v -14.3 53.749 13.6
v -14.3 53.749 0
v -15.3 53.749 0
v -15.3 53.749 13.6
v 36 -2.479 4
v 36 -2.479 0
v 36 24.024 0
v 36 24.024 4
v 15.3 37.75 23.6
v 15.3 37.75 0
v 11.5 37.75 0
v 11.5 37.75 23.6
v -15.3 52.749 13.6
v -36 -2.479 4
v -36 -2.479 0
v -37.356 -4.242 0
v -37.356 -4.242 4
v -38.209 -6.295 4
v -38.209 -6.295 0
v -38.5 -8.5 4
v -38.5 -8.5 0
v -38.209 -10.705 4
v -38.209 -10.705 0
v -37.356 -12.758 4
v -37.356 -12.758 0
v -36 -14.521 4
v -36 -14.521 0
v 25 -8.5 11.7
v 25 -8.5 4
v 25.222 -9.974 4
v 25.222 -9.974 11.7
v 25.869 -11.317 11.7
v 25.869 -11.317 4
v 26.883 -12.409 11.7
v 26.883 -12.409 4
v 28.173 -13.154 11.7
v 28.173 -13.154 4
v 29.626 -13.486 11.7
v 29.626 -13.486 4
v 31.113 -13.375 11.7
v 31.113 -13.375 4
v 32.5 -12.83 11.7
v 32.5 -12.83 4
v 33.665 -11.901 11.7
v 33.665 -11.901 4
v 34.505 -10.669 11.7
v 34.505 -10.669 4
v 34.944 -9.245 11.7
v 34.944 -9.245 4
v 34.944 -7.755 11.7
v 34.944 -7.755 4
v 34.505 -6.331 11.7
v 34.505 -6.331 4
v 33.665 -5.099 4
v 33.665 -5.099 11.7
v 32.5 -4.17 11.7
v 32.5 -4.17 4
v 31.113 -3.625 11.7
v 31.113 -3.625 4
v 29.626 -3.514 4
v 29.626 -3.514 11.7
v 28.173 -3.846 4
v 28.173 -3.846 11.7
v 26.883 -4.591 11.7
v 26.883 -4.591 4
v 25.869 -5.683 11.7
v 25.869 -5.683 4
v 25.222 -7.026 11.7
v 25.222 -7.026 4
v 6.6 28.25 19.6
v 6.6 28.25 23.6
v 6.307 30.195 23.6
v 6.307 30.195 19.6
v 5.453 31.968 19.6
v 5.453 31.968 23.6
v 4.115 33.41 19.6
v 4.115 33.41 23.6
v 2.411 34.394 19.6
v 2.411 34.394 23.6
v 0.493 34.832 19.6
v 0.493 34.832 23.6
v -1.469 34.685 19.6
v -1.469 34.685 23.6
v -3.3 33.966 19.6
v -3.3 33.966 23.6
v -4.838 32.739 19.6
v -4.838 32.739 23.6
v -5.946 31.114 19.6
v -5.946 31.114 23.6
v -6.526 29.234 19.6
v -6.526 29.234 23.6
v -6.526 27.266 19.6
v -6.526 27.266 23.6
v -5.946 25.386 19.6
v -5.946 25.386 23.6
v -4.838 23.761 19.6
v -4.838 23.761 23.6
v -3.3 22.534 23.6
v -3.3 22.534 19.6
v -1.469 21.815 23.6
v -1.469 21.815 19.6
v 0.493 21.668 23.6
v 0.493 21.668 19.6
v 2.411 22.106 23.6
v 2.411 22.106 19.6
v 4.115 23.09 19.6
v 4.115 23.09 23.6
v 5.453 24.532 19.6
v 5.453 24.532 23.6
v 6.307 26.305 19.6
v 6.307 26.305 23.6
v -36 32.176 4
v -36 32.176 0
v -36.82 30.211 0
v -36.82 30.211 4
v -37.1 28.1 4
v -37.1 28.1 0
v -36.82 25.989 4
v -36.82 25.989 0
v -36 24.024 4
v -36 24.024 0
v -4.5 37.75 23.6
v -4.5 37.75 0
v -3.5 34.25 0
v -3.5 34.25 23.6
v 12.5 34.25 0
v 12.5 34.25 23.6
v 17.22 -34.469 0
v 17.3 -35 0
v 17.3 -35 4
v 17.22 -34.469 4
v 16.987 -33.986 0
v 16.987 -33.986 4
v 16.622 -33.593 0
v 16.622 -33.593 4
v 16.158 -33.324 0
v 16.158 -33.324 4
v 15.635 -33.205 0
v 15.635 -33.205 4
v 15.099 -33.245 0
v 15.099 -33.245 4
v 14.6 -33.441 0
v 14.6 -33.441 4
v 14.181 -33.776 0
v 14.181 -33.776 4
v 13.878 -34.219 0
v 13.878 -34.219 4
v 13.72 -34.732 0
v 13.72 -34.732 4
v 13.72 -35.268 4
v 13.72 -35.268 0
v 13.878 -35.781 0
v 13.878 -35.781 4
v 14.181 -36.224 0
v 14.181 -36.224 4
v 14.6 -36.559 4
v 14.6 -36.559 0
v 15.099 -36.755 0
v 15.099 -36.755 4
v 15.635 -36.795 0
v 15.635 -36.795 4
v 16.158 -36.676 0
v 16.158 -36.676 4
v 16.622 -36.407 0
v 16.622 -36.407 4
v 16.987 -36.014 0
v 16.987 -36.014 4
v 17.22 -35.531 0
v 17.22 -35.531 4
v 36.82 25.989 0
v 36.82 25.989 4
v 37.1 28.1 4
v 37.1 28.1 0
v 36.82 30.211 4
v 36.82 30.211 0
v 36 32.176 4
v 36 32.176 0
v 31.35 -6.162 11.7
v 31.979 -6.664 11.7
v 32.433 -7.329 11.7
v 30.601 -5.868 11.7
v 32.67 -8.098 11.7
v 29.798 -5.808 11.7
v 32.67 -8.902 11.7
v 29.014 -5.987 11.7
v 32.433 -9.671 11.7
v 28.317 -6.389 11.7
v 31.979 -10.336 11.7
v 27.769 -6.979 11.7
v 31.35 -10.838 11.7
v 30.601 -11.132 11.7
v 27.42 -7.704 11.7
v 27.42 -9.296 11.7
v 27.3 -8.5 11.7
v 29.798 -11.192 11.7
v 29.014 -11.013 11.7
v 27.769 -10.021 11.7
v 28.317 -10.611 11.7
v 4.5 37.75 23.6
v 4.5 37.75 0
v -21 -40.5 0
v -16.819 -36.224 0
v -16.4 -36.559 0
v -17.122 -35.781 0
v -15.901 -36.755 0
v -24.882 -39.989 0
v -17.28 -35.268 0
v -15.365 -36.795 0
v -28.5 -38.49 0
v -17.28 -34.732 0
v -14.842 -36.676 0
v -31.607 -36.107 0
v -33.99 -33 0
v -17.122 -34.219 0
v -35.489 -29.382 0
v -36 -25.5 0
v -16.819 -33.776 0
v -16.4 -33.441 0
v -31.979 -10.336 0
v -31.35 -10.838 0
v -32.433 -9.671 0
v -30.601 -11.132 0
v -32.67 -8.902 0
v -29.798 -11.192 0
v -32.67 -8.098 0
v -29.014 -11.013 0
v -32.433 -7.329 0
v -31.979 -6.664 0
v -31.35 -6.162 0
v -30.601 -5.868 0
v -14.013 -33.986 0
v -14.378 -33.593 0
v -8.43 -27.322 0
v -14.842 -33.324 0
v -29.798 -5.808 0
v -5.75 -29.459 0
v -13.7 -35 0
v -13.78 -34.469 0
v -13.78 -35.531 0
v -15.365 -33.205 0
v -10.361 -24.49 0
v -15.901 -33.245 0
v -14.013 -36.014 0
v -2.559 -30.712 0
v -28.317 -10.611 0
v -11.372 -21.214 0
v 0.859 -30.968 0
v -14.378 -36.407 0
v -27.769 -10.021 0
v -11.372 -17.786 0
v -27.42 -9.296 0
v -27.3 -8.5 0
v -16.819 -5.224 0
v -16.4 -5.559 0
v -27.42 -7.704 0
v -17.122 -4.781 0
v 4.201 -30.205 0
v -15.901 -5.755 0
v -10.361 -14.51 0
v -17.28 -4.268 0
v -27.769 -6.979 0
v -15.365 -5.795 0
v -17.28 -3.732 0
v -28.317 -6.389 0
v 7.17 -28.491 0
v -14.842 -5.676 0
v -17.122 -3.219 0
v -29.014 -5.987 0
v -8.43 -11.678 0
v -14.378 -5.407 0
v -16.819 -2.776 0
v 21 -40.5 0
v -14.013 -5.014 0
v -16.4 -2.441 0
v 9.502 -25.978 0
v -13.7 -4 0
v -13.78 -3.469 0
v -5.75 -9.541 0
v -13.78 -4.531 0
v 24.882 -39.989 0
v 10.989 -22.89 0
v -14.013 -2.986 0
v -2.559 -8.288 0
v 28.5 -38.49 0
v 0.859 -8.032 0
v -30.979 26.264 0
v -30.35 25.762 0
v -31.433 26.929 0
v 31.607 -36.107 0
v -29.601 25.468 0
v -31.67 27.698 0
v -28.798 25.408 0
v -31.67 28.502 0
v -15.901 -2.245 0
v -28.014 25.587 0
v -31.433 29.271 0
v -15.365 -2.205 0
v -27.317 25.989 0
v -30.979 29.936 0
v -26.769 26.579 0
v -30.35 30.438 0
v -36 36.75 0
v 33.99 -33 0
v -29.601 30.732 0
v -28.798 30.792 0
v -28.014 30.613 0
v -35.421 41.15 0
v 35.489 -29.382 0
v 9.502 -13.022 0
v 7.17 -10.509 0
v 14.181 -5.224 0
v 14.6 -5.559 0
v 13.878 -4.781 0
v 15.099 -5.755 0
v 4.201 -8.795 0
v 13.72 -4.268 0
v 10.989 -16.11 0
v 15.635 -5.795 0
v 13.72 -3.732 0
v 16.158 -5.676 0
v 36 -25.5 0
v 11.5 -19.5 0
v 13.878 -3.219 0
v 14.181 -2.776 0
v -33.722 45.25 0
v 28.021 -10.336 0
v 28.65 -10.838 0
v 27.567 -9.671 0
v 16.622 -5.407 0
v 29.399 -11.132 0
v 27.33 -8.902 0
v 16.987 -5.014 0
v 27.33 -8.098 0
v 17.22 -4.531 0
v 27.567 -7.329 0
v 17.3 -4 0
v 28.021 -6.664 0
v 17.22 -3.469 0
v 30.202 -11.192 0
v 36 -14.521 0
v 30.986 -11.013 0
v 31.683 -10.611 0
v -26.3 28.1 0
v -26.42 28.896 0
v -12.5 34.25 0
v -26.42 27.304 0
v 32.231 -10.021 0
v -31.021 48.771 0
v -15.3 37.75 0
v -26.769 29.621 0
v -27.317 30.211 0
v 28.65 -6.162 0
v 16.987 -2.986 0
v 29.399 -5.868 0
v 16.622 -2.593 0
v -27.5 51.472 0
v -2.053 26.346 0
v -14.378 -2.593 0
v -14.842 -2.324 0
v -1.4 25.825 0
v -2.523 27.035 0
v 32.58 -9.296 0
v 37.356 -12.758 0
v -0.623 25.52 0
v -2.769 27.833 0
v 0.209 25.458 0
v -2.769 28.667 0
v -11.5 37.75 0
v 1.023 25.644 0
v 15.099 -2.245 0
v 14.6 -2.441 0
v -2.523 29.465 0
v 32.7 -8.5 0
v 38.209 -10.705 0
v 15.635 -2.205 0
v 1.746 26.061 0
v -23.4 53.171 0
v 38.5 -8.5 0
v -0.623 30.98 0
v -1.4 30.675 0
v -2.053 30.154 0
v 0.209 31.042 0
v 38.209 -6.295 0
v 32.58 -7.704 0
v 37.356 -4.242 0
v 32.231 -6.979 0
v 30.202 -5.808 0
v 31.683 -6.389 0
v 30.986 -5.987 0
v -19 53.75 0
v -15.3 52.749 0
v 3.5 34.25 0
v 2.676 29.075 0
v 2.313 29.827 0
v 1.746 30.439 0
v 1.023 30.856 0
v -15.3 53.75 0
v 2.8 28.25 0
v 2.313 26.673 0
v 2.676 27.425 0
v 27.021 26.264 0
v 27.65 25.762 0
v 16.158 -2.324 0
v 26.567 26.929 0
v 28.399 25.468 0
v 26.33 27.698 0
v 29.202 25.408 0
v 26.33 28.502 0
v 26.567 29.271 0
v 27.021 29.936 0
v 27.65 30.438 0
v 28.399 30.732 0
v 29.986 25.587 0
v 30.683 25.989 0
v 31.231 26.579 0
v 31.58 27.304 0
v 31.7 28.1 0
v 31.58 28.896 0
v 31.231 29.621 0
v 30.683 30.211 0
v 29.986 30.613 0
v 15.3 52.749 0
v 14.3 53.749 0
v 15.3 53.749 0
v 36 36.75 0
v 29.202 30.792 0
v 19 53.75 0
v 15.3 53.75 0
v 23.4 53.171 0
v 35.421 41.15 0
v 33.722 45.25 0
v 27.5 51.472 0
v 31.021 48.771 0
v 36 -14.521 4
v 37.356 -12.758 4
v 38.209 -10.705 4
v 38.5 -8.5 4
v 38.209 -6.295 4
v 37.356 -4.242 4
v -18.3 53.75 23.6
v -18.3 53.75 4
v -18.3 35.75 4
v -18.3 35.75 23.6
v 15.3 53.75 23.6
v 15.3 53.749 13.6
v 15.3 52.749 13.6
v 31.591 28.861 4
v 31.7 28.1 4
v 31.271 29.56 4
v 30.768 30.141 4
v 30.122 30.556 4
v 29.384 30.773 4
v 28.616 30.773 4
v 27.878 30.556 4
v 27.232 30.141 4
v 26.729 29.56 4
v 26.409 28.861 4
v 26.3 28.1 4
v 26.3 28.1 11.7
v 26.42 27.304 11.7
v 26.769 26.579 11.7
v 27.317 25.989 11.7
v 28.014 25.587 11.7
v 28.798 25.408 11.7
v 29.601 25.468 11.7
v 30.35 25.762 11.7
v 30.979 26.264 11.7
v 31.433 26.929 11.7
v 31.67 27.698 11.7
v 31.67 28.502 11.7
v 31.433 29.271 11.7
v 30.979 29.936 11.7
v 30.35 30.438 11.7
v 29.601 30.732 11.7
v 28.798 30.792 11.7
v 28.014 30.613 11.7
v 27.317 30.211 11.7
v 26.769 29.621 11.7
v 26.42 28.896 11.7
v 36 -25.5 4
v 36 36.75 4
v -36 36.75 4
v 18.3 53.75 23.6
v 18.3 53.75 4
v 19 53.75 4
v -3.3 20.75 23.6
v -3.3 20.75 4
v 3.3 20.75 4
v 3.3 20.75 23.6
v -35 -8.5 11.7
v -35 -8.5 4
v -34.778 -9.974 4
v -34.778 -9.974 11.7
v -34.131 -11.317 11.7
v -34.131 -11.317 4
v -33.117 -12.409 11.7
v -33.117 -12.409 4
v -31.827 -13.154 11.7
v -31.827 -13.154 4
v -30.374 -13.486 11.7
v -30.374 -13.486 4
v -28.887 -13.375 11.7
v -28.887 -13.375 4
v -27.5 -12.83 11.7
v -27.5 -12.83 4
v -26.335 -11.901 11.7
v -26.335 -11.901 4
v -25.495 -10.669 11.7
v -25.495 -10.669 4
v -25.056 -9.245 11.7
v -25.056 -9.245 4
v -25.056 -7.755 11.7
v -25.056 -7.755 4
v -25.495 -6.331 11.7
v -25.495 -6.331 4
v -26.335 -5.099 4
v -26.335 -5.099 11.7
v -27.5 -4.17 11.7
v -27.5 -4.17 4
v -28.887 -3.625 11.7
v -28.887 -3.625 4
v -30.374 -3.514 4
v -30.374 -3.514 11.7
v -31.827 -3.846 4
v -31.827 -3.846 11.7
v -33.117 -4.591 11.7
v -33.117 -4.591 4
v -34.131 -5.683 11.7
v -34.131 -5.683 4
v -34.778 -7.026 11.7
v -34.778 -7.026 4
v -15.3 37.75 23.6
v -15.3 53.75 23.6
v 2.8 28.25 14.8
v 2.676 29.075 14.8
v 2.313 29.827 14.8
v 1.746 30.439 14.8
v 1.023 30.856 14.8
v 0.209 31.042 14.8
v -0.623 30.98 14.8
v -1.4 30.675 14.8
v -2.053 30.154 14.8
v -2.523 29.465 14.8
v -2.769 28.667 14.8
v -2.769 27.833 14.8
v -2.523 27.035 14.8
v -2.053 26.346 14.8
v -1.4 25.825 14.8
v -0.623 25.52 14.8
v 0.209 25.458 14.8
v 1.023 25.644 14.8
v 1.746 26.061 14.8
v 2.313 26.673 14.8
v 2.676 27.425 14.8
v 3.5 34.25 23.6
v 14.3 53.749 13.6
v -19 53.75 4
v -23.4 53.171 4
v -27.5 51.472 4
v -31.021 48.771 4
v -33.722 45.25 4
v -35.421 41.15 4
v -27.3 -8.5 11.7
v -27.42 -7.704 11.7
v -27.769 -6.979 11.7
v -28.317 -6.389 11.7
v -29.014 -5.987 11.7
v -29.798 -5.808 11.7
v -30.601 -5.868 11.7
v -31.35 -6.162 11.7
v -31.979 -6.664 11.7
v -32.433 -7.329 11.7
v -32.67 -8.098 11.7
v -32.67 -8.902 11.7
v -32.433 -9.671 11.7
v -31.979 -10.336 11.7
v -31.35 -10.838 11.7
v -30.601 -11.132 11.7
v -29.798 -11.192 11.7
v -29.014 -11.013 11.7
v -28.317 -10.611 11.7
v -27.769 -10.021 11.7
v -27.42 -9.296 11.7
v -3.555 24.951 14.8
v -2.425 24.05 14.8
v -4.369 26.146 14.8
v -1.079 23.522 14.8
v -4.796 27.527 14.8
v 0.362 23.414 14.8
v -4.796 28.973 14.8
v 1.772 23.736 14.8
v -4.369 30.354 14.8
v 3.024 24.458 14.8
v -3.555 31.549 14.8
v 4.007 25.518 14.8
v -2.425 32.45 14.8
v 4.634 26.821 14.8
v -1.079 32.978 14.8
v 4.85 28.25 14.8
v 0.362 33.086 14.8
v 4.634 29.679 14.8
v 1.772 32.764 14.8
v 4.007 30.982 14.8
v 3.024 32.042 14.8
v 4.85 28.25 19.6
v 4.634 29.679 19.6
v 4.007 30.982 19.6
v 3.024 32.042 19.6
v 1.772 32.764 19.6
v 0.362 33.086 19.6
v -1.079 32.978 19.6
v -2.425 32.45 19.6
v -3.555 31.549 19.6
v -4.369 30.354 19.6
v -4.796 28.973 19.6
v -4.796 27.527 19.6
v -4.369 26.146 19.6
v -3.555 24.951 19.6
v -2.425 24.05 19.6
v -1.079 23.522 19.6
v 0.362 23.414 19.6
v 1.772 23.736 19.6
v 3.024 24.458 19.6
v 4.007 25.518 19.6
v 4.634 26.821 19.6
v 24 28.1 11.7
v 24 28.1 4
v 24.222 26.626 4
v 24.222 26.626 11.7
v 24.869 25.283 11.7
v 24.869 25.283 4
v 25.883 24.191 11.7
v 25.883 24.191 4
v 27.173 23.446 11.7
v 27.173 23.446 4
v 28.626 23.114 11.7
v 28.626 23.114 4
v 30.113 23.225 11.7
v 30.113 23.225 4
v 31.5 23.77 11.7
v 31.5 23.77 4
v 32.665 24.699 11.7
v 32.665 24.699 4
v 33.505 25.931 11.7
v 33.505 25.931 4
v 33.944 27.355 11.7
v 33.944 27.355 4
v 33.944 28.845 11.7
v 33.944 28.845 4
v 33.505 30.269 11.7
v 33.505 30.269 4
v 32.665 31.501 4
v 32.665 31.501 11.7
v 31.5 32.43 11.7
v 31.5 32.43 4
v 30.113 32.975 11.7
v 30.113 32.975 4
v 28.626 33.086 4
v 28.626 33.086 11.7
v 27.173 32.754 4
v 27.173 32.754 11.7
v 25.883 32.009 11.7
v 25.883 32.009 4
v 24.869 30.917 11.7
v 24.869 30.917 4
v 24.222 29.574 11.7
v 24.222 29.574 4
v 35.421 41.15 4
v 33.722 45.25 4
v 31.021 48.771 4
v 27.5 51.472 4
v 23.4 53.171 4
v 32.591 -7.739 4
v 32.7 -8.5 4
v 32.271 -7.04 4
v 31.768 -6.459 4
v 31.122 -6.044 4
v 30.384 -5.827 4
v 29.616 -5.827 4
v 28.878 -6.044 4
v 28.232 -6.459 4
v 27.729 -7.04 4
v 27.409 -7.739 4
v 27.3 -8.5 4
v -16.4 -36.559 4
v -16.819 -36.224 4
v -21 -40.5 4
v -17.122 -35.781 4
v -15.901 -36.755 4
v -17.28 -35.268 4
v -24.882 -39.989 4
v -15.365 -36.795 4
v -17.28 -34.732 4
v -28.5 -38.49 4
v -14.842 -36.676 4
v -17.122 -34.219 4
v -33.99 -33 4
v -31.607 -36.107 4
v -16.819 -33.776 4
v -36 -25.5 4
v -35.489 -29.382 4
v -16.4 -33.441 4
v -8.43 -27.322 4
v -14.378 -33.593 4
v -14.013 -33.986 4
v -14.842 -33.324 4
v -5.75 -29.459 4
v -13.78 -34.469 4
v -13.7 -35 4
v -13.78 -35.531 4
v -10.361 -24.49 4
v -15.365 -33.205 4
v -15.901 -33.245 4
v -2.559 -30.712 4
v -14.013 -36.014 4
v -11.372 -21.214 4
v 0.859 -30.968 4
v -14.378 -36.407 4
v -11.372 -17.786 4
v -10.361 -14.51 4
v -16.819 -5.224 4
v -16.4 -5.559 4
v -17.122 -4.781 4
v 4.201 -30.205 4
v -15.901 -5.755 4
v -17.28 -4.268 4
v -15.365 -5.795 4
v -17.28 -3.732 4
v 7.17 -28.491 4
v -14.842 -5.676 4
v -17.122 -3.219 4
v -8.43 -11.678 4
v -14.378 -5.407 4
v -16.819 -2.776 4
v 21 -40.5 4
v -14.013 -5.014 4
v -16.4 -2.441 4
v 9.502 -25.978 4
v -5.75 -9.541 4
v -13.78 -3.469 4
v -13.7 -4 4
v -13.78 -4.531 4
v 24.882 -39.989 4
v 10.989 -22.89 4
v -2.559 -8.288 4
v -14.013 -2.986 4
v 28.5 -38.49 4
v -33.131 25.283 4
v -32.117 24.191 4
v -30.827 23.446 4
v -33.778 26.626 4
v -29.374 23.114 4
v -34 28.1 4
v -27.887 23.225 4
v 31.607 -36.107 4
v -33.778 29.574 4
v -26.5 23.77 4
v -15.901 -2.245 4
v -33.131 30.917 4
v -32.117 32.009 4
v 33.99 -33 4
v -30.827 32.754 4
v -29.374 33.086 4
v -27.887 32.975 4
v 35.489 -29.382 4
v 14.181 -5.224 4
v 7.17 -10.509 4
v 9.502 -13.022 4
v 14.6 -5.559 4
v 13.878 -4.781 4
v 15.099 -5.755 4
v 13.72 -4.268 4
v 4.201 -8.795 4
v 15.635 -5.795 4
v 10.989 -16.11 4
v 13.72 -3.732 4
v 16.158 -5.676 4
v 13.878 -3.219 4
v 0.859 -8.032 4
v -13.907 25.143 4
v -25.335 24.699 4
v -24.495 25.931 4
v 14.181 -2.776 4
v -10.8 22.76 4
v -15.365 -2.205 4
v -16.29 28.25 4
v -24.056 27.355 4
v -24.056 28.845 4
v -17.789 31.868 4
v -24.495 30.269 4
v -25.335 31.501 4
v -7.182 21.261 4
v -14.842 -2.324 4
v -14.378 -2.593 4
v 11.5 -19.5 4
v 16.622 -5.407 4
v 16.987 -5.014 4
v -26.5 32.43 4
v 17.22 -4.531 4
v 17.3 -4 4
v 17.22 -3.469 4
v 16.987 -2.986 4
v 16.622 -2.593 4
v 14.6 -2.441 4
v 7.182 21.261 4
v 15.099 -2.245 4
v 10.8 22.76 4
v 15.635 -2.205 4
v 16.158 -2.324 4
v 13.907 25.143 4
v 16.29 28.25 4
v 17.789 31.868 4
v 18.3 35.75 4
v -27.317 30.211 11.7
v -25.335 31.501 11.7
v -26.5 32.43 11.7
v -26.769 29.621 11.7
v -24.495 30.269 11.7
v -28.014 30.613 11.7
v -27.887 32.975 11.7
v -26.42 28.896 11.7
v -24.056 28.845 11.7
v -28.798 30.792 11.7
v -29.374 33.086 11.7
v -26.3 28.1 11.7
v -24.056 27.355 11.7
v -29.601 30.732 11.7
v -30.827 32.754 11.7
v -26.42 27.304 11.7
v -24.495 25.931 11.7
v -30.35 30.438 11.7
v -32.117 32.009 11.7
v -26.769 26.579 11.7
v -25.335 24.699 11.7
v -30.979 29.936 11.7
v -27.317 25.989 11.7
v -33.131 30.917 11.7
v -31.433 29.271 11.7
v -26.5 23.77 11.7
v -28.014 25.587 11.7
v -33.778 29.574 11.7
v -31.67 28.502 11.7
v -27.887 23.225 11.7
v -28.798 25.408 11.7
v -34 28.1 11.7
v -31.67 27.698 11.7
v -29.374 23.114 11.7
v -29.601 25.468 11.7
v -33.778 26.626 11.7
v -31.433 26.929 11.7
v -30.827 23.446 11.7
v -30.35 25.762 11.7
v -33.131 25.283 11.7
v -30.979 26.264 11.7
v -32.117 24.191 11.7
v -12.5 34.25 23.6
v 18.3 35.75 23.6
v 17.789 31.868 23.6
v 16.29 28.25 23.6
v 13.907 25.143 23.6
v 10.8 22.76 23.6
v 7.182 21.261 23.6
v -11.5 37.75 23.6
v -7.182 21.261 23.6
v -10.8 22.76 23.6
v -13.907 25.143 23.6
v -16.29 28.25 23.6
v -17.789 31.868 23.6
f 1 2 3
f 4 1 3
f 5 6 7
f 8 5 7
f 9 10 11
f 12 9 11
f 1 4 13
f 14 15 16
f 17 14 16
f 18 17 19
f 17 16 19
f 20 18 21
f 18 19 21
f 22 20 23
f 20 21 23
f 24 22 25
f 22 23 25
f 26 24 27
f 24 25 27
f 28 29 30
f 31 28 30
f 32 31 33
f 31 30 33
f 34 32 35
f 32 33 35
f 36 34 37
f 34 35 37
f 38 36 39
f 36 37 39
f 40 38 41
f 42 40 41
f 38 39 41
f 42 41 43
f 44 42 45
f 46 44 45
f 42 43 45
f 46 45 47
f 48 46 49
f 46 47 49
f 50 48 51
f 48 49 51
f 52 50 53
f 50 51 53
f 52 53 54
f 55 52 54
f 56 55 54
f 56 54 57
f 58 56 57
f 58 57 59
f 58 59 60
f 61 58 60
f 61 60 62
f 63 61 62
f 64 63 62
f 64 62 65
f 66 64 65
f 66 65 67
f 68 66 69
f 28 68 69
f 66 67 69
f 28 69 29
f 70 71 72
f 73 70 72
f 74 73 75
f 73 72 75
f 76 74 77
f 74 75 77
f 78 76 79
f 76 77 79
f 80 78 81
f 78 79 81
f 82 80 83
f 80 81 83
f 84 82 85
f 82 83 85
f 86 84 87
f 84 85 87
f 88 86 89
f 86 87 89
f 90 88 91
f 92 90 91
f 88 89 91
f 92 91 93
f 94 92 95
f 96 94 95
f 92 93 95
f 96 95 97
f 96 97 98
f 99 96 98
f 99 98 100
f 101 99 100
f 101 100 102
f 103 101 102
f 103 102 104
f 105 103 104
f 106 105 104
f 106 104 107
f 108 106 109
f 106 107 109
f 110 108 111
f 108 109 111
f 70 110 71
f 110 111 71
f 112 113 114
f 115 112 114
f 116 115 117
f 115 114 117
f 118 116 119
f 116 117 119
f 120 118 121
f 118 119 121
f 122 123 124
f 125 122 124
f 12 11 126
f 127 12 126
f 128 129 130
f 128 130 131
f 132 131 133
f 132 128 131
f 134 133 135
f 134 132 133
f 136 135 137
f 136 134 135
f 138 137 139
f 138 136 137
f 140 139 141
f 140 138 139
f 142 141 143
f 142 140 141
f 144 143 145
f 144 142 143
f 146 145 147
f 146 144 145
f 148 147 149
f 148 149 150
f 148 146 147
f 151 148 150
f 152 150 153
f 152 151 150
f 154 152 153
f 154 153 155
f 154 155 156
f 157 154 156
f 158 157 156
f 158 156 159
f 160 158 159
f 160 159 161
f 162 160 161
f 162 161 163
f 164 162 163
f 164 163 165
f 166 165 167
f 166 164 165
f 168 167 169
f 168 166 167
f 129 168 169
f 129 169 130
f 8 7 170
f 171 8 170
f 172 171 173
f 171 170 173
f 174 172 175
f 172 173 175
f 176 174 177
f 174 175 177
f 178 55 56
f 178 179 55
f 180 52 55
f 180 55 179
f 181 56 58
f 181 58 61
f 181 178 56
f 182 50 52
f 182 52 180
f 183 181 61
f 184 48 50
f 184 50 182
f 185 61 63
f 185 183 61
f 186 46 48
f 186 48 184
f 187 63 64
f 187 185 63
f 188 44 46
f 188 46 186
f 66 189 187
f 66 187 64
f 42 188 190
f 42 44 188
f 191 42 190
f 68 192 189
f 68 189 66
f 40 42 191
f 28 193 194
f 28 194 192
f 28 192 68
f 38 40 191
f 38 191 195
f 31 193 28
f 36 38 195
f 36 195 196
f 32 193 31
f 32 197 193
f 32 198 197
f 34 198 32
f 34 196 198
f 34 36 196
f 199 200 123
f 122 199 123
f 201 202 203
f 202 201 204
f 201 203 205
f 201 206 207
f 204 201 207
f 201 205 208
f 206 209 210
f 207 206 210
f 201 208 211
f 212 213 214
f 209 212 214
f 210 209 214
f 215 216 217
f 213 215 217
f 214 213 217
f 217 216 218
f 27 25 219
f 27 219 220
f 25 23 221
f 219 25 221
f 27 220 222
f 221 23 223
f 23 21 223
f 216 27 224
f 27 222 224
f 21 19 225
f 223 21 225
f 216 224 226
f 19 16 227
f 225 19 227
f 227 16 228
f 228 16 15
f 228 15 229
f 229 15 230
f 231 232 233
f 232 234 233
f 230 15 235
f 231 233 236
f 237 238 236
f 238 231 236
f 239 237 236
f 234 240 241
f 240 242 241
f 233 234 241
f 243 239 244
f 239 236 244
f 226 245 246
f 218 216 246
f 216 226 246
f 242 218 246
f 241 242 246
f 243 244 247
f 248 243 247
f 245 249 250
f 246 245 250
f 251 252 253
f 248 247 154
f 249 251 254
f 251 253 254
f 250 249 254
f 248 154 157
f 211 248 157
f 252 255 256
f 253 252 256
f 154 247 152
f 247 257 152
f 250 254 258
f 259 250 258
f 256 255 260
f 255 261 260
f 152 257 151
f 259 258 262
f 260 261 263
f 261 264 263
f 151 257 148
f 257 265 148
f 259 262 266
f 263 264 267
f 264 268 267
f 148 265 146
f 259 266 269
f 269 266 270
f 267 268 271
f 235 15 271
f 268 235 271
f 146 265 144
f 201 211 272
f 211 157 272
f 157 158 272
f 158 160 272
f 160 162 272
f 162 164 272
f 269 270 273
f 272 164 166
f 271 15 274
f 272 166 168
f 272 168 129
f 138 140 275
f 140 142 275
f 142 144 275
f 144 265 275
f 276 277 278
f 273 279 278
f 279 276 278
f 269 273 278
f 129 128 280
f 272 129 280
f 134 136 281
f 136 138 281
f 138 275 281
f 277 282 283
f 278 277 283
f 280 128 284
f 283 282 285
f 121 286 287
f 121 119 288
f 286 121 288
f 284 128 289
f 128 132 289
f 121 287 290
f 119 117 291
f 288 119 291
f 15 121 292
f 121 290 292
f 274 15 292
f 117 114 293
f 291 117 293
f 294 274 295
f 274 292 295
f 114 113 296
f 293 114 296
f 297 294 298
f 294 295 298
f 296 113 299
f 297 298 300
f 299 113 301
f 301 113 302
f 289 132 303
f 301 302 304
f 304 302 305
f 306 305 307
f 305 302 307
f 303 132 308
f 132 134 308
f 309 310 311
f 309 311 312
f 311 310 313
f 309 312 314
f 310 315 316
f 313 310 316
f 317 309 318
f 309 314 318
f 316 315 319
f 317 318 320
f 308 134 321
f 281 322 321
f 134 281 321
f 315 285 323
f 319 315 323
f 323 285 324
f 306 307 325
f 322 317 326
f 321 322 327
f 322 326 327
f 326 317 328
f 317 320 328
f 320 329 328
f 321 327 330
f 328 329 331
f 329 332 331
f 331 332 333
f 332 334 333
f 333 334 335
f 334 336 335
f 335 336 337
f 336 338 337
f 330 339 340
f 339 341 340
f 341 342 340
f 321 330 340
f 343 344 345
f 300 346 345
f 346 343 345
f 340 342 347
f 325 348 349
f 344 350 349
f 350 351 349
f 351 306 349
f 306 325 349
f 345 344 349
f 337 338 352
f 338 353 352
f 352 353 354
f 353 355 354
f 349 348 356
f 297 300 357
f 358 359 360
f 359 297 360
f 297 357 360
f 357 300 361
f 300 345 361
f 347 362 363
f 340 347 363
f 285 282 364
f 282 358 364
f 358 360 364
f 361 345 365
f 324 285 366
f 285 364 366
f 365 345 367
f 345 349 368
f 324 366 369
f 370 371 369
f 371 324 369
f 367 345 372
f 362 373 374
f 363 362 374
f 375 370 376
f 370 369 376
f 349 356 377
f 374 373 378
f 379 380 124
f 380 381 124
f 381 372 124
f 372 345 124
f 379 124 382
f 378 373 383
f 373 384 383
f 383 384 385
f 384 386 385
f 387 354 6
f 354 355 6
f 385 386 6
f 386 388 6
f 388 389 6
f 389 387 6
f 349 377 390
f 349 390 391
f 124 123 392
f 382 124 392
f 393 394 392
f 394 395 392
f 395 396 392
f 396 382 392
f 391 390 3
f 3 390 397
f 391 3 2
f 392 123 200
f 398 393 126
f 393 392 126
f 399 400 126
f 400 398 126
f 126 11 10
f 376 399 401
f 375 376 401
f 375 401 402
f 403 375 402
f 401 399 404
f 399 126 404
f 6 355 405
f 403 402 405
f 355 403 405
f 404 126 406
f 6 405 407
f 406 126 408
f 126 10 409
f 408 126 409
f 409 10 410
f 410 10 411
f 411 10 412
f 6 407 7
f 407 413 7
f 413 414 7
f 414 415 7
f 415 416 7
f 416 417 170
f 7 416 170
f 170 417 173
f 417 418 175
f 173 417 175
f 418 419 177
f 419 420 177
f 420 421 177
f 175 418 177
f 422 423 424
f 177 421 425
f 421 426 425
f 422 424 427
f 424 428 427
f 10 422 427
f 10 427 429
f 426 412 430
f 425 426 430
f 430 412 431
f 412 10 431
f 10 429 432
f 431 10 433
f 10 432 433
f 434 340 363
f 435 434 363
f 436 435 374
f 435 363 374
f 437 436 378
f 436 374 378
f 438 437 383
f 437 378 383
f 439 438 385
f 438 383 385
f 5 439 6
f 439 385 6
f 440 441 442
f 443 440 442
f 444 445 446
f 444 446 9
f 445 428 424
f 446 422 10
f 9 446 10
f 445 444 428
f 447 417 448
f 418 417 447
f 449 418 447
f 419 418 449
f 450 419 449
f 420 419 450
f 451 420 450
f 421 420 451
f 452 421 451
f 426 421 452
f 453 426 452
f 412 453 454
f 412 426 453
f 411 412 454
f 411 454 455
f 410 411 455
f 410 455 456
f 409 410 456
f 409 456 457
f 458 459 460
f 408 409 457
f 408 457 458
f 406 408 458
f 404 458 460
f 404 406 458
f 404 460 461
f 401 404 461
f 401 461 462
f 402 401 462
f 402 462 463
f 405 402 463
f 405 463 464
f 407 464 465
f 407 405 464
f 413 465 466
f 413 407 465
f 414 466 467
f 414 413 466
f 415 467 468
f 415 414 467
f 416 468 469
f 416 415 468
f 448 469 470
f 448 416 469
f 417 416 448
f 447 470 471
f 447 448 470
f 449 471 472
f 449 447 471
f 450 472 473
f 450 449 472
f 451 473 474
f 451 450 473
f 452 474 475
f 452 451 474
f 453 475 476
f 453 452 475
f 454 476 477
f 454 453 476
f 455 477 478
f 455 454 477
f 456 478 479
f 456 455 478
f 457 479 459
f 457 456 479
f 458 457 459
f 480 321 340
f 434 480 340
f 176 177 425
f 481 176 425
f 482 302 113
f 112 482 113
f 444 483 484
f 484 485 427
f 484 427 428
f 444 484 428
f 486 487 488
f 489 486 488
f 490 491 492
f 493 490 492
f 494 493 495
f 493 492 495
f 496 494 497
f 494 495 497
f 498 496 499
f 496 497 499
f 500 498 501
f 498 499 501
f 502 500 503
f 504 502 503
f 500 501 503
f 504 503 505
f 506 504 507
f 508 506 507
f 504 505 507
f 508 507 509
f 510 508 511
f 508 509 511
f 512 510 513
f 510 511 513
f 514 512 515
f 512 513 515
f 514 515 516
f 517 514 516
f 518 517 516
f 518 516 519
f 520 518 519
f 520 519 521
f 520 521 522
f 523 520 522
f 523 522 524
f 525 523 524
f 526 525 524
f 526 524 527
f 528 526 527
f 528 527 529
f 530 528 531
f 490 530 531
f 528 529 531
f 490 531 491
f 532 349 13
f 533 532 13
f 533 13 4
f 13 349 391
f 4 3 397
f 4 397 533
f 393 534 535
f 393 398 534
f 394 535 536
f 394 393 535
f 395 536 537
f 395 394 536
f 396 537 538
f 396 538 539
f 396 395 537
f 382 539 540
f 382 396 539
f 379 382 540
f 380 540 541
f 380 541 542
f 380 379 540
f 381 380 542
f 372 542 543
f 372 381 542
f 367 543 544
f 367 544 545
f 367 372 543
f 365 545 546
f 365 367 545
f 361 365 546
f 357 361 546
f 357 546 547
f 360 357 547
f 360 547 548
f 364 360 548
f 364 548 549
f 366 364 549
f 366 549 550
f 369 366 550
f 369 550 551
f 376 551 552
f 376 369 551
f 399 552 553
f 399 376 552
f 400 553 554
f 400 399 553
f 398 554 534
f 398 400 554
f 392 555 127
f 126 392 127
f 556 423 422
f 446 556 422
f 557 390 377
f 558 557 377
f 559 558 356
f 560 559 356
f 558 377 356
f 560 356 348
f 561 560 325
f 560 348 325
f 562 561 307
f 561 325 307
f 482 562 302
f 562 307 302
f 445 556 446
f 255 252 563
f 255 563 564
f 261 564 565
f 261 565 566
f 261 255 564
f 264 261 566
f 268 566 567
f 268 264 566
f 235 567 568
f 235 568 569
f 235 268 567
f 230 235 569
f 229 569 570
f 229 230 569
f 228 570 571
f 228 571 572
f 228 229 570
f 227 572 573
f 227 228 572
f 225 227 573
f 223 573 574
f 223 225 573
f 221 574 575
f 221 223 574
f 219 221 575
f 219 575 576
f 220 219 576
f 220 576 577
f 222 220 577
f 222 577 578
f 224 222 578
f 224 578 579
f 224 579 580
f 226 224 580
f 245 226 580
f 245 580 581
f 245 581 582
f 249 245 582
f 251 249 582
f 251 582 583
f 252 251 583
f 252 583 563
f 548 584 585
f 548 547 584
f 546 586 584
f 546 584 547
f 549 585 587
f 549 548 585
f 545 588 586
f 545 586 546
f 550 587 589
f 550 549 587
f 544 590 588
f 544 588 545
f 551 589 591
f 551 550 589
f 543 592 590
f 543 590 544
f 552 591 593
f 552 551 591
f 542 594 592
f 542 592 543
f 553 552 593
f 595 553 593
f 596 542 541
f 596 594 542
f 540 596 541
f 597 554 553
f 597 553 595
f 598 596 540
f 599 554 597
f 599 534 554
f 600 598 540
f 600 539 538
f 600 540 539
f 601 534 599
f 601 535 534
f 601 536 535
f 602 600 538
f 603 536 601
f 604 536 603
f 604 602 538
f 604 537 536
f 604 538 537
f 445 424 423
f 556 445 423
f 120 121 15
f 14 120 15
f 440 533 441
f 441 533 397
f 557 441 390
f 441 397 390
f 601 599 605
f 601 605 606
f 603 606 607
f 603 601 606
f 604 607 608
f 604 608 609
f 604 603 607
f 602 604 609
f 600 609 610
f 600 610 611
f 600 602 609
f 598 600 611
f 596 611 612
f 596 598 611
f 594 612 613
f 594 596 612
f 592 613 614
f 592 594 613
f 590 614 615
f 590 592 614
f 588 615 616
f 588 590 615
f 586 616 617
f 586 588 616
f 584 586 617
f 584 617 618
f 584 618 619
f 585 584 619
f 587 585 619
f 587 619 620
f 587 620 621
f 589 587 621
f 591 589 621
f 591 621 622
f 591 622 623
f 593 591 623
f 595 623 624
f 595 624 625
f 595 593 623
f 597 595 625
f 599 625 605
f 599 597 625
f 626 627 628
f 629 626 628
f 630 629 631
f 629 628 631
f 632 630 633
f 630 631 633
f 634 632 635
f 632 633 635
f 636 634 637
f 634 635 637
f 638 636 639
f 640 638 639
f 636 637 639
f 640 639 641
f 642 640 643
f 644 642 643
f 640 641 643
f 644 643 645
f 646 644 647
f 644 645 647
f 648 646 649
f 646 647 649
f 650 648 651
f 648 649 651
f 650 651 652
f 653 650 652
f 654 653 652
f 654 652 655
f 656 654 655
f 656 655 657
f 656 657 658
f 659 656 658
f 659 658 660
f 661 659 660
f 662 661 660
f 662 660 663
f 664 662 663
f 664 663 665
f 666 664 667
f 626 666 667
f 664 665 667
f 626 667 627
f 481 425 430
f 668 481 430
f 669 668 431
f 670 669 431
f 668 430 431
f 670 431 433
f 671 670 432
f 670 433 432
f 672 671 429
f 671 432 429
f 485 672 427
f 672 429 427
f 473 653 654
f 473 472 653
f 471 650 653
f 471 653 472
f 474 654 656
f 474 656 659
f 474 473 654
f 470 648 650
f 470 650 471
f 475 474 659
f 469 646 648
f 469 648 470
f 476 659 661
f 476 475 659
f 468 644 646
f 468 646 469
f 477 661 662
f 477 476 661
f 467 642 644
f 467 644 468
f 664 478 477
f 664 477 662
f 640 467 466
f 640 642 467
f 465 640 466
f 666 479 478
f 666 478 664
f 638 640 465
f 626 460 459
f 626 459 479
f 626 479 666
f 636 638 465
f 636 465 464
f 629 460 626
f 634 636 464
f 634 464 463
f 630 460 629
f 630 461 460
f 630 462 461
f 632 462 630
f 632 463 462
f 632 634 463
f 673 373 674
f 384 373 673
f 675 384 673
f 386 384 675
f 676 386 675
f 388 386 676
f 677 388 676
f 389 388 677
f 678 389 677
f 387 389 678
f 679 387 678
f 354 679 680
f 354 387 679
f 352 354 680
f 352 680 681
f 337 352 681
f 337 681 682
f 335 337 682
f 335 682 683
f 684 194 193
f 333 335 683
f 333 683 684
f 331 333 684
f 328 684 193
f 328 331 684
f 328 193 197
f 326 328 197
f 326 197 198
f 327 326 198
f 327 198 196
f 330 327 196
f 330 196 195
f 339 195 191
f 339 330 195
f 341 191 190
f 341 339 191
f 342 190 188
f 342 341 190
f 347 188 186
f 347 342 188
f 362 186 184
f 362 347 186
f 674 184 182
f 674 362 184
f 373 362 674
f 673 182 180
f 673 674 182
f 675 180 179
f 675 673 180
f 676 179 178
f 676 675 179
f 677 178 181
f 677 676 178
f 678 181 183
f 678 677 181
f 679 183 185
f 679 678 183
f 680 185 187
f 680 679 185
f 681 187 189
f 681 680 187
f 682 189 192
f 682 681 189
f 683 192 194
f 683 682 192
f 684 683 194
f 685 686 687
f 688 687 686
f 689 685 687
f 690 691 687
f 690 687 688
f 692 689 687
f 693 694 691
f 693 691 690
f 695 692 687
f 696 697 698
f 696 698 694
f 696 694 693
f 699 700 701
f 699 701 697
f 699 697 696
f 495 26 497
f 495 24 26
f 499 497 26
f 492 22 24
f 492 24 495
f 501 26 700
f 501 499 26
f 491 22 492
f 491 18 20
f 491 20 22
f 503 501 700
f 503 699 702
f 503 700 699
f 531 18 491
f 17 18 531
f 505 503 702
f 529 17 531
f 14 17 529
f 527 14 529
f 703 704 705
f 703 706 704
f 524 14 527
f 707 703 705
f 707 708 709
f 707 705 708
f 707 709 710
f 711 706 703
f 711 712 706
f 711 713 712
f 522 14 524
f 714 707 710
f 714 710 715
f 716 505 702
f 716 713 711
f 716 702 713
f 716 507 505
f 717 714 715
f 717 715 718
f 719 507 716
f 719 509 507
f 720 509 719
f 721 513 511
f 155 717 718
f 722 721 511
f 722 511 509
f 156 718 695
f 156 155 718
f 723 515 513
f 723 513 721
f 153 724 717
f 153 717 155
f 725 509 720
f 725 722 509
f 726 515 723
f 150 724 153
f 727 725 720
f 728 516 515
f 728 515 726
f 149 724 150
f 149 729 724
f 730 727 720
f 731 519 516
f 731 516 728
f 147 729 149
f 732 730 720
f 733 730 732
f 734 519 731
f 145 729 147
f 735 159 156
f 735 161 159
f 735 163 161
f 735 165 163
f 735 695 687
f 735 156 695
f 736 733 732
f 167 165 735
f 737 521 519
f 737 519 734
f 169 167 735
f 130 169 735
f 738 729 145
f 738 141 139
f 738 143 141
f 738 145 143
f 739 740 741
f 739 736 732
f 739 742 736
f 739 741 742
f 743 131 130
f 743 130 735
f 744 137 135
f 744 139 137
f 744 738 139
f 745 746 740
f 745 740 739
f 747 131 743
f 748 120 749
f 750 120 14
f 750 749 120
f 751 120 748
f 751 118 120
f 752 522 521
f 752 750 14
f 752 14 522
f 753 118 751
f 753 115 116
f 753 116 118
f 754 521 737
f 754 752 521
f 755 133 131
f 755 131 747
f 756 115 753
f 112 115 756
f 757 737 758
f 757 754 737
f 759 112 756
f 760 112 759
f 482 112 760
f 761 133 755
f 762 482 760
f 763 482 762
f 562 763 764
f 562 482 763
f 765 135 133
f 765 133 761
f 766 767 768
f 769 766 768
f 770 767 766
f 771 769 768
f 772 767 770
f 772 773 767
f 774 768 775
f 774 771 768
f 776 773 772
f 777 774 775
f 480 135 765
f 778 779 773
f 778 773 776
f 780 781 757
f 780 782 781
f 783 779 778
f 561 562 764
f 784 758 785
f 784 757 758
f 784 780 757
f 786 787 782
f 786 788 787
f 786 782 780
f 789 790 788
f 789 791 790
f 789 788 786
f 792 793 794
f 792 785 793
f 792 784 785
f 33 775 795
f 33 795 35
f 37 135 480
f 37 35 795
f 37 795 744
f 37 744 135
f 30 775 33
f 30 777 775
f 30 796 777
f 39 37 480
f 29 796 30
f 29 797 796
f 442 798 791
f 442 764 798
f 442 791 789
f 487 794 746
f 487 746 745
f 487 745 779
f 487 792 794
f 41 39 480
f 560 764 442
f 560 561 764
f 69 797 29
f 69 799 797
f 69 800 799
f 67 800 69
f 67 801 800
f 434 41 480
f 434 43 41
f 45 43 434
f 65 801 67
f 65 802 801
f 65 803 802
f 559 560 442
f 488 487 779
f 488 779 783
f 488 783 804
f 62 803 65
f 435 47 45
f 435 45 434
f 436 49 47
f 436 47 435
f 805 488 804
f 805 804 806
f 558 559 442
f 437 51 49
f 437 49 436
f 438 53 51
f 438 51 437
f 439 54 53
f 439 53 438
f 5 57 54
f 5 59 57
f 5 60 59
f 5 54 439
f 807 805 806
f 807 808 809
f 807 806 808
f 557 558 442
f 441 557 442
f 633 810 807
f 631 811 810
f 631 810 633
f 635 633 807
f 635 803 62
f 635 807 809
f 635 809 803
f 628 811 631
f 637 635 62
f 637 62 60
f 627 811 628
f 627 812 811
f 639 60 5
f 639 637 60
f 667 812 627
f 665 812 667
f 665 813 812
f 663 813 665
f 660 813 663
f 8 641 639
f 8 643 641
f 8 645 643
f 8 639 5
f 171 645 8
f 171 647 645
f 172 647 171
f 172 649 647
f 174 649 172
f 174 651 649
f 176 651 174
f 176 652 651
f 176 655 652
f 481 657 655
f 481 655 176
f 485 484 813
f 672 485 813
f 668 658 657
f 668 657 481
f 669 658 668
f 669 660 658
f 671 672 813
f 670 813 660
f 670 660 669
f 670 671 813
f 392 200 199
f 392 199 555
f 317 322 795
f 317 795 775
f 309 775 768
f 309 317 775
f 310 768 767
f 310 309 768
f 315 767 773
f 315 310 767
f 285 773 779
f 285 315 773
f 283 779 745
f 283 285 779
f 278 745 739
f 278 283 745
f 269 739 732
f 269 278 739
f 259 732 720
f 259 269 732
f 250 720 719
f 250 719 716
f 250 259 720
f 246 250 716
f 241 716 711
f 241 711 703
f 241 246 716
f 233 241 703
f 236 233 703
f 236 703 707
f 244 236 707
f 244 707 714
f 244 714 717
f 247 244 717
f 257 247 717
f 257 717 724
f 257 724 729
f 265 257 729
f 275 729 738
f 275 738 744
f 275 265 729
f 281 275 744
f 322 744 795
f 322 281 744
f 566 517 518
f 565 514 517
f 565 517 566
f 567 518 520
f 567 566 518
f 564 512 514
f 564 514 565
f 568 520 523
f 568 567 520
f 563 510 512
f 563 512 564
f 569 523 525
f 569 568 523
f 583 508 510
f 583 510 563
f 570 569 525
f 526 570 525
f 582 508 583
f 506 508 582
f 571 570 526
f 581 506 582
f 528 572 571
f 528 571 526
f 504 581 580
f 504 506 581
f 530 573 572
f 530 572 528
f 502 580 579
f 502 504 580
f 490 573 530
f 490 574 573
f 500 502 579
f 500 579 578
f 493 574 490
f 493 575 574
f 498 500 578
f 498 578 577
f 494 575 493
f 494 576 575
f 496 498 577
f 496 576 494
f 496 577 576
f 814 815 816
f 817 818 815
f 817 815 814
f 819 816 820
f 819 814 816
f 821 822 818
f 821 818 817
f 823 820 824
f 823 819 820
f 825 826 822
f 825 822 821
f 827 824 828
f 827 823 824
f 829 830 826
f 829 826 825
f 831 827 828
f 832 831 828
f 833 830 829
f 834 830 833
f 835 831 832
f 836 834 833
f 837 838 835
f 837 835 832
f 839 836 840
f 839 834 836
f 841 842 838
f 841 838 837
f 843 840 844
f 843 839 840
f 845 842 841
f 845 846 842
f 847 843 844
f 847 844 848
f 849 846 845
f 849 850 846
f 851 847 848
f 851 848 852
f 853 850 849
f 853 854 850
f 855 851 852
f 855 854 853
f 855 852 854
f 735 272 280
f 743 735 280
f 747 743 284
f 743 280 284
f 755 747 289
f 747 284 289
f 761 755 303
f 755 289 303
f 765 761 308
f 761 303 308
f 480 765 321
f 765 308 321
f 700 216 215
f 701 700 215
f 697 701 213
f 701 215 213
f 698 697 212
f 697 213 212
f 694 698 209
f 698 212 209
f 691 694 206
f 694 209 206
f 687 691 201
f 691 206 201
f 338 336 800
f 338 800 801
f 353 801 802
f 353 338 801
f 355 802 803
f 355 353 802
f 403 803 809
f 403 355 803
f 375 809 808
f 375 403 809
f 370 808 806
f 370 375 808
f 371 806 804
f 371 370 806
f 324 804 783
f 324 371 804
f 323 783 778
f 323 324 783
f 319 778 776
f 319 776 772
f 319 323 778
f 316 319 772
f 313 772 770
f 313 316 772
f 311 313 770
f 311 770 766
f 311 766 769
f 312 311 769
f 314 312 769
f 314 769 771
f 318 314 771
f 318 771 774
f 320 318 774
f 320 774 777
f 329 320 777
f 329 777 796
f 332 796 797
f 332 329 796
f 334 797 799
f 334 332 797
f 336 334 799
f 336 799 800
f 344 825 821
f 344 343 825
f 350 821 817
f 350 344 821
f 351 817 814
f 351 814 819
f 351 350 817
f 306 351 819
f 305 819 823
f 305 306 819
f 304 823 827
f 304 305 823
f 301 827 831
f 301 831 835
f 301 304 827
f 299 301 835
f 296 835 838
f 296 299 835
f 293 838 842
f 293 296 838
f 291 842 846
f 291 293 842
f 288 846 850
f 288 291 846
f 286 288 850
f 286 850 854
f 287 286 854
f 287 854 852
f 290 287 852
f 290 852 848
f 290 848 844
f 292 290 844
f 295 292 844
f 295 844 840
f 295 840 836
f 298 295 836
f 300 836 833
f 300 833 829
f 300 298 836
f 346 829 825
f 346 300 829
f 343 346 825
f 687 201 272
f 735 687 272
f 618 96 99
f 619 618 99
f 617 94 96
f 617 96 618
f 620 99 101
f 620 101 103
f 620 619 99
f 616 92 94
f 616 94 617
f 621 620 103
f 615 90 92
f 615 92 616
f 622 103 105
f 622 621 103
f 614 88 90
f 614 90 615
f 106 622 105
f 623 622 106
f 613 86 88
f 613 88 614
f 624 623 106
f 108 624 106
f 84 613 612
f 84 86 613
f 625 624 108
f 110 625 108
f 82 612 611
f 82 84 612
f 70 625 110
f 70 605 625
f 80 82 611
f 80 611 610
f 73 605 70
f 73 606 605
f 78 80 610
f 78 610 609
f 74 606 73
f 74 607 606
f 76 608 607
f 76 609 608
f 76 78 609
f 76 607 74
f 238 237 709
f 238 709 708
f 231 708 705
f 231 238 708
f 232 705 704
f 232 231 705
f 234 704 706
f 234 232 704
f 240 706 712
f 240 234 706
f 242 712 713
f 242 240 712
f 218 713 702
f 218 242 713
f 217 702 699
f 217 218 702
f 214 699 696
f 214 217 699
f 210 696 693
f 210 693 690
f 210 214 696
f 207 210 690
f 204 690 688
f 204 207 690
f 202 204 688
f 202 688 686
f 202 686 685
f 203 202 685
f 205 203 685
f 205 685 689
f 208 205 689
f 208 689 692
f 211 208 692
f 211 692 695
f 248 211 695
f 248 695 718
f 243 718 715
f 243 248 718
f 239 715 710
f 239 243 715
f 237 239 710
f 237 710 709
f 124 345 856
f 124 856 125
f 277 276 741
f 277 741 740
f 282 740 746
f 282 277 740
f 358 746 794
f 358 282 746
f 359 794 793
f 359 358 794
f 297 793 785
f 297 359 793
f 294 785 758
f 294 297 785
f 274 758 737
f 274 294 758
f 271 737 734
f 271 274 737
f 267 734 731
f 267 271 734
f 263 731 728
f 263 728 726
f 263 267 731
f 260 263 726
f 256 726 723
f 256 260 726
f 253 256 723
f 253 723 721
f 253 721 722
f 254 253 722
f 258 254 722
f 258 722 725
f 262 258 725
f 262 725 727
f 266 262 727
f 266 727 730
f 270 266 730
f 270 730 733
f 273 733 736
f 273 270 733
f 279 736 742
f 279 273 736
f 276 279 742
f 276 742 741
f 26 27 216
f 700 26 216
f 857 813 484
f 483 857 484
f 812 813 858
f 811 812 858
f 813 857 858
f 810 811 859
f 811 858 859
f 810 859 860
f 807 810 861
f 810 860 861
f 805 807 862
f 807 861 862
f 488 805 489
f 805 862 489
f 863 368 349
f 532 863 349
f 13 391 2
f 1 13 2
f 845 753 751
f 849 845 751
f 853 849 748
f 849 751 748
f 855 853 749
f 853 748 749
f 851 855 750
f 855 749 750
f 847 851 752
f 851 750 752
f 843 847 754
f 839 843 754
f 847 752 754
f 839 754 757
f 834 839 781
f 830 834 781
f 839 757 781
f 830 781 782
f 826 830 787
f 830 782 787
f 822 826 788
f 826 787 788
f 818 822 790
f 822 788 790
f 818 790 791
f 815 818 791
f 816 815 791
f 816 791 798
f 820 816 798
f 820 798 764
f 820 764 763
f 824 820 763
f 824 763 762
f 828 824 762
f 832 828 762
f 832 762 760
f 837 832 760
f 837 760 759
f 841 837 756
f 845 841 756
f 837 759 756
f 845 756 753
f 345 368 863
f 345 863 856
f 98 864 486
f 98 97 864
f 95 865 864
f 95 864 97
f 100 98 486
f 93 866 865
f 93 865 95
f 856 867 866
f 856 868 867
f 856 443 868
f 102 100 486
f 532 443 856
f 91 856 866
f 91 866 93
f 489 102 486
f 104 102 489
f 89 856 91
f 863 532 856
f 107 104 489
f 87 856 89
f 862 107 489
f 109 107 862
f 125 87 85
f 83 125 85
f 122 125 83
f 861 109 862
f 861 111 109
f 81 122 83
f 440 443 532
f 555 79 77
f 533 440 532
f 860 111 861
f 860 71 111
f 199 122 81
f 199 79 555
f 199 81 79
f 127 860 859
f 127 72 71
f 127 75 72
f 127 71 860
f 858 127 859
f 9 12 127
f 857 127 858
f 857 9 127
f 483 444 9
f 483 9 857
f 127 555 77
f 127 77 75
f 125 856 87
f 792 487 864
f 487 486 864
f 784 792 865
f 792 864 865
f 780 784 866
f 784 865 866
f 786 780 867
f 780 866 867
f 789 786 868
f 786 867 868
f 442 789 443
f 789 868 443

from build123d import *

# Parameters (mm, degrees)
SKETCH_1_R           = 2.8
SKETCH_1_R_2         = 2.7
SKETCH_1_R_3         = 1.8
SKETCH_1_R_4         = 11.5
EXTRUDE_1_DEPTH      = 4
EXTRUDE_START        = 4
SKETCH_1_4_R         = 2.8
EXTRUDE_3_DEPTH      = 19.6
SKETCH_9_R           = 5
SKETCH_9_R_2         = 2.7
EXTRUDE_4_DEPTH      = 7.7
FILLET_1_R           = 15
SKETCH_12_R          = 6.6
CUT_EXTRUDE_12_DEPTH = 4
CUT_EXTRUDE_START    = -8.8
SKETCH_12_5_R        = 4.849742261
SKETCH_12_5_R_2      = 2.8
CUT_EXTRUDE_13_DEPTH = 4.8
CUT_EXTRUDE_14_REACH = 72.202
CUT_EXTRUDE_15_DEPTH = 10


with BuildPart() as part:
    # 草图1 → 凸台-拉伸1 (new body)
    with BuildSketch(Plane.XY):
        with BuildLine():
            Line((-11.5, 37.75), (-15.3, 37.75))
            Line((-15.3, 37.75), (-15.3, 52.749))
            Line((-15.3, 52.749), (-14.3, 53.749))
            Line((-14.3, 53.749), (-15.3, 53.749))
            Line((-15.3, 53.749), (-15.3, 53.75))
            Line((-15.3, 53.75), (-19, 53.75))
            ThreePointArc((-19, 53.75), (-31.02081528, 48.77081528), (-36, 36.75))
            Line((-36, 36.75), (-36, 32.175536774))
            ThreePointArc((-36, 32.175536774), (-37.1, 28.1), (-36, 24.024463226))
            Line((-36, 24.024463226), (-36, -2.479202711))
            ThreePointArc((-36, -2.479202711), (-38.5, -8.5), (-36, -14.520797289))
            Line((-36, -14.520797289), (-36, -25.5))
            ThreePointArc((-36, -25.5), (-31.606601718, -36.106601718), (-21, -40.5))
            Line((-21, -40.5), (21, -40.5))
            ThreePointArc((21, -40.5), (31.606601718, -36.106601718), (36, -25.5))
            Line((36, -25.5), (36, -14.520797289))
            ThreePointArc((36, -14.520797289), (38.5, -8.5), (36, -2.479202711))
            Line((36, -2.479202711), (36, 24.024463226))
            ThreePointArc((36, 24.024463226), (37.1, 28.1), (36, 32.175536774))
            Line((36, 32.175536774), (36, 36.75))
            ThreePointArc((36, 36.75), (31.02081528, 48.77081528), (19, 53.75))
            Line((19, 53.75), (15.3, 53.75))
            Line((15.3, 53.75), (15.3, 53.749))
            Line((15.3, 53.749), (14.3, 53.749))
            Line((14.3, 53.749), (15.3, 52.749))
            Line((15.3, 52.749), (15.3, 37.75))
            Line((15.3, 37.75), (11.5, 37.75))
            Line((11.5, 37.75), (11.5, 34.25))
            Line((11.5, 34.25), (4.5, 34.25))
            Line((4.5, 34.25), (4.5, 37.75))
            Line((4.5, 37.75), (-4.5, 37.75))
            Line((-4.5, 37.75), (-4.5, 34.25))
            Line((-4.5, 34.25), (-11.5, 34.25))
            Line((-11.5, 34.25), (-11.5, 37.75))
        make_face()
        with Locations((0, 28.25)):
            Circle(SKETCH_1_R, mode=Mode.SUBTRACT)
        with Locations((-29, 28.1)):
            Circle(SKETCH_1_R_2, mode=Mode.SUBTRACT)
        with Locations((-30, -8.5)):
            Circle(SKETCH_1_R_2, mode=Mode.SUBTRACT)
        with Locations((29, 28.1)):
            Circle(SKETCH_1_R_2, mode=Mode.SUBTRACT)
        with Locations((30, -8.5)):
            Circle(SKETCH_1_R_2, mode=Mode.SUBTRACT)
        with Locations((15.5, -4)):
            Circle(SKETCH_1_R_3, mode=Mode.SUBTRACT)
        with Locations((0, -19.5)):
            Circle(SKETCH_1_R_4, mode=Mode.SUBTRACT)
        with Locations((15.5, -35)):
            Circle(SKETCH_1_R_3, mode=Mode.SUBTRACT)
        with Locations((-15.5, -35)):
            Circle(SKETCH_1_R_3, mode=Mode.SUBTRACT)
        with Locations((-15.5, -4)):
            Circle(SKETCH_1_R_3, mode=Mode.SUBTRACT)
    extrude(amount=EXTRUDE_1_DEPTH)

    # 草图1<4> → 凸台-拉伸3 (add)
    with BuildSketch(Plane.XY.offset(EXTRUDE_START)):
        Polygon((-11.5, 37.75), (-15.3, 37.75), (-15.3, 52.749), (-14.3, 53.749), (-15.3, 53.749), (-15.3, 53.75), (-18.3, 53.75), (-18.3, 20.75), (18.3, 20.75), (18.3, 53.75), (15.3, 53.75), (15.3, 53.749), (14.3, 53.749), (15.3, 52.749), (15.3, 37.75), (11.5, 37.75), (11.5, 34.25), (4.5, 34.25), (4.5, 37.75), (-4.5, 37.75), (-4.5, 34.25), (-11.5, 34.25), align=None)
        with Locations((0, 28.25)):
            Circle(SKETCH_1_4_R, mode=Mode.SUBTRACT)
    extrude(amount=EXTRUDE_3_DEPTH)

    # 草图9 → 凸台-拉伸4 (add)
    # profile 1 of 4: a face of its own
    with BuildSketch(Plane.XY.offset(4)):
        with Locations(Location((-29, 28.1, 0), (0, 0, 180))):
            Circle(SKETCH_9_R)
        with Locations((-29, 28.1)):
            Circle(SKETCH_9_R_2, mode=Mode.SUBTRACT)
    # profile 2 of 4: a face of its own
    with BuildSketch(Plane.XY.offset(4)):
        with Locations(Location((-30, -8.5, 0), (0, 0, 180))):
            Circle(SKETCH_9_R)
        with Locations((-30, -8.5)):
            Circle(SKETCH_9_R_2, mode=Mode.SUBTRACT)
    # profile 3 of 4: a face of its own
    with BuildSketch(Plane.XY.offset(4)):
        with Locations(Location((30, -8.5, 0), (0, 0, 180))):
            Circle(SKETCH_9_R)
        with Locations(Location((30, -8.5, 0), (0, 0, 180))):
            Circle(SKETCH_9_R_2, mode=Mode.SUBTRACT)
    # profile 4 of 4: a face of its own
    with BuildSketch(Plane.XY.offset(4)):
        with Locations(Location((29, 28.1, 0), (0, 0, 180))):
            Circle(SKETCH_9_R)
        with Locations(Location((29, 28.1, 0), (0, 0, 180))):
            Circle(SKETCH_9_R_2, mode=Mode.SUBTRACT)
    extrude(amount=EXTRUDE_4_DEPTH)

    # 圆角1
    fillet_1_edges = [part.edges().sort_by_distance(p)[0] for p in [
        (-18.3, 20.75, 13.8),
        (18.3, 20.75, 13.8),
    ]]
    fillet(fillet_1_edges, radius=FILLET_1_R)

    # 草图12 → 切除-拉伸12 (cut)
    with BuildSketch(Plane.XY.offset(23.6)):
        with Locations((0, 28.25)):
            Circle(SKETCH_12_R)
    extrude(amount=-CUT_EXTRUDE_12_DEPTH, mode=Mode.SUBTRACT)

    # 草图12<5> → 切除-拉伸13 (cut)
    with BuildSketch(Plane.XY.offset(23.6).offset(CUT_EXTRUDE_START)):
        with Locations((0, 28.25)):
            Circle(SKETCH_12_5_R)
        with Locations((0, 28.25)):
            Circle(SKETCH_12_5_R_2, mode=Mode.SUBTRACT)
    extrude(amount=CUT_EXTRUDE_13_DEPTH, mode=Mode.SUBTRACT)

    # 草图13 → 切除-拉伸14 (cut, up to next)
    with BuildSketch(Plane.XY.offset(23.6), mode=Mode.PRIVATE) as cut_extrude_14_sk1:
        Polygon((-4.5, 37.75), (-3.5, 34.25), (-4.5, 34.25), align=None)
    cut_extrude_14_tool1 = extrude(cut_extrude_14_sk1.sketch, amount=-CUT_EXTRUDE_14_REACH, mode=Mode.PRIVATE) & part.part
    # 草图13 → 切除-拉伸14 (cut, up to next)
    with BuildSketch(Plane.XY.offset(23.6), mode=Mode.PRIVATE) as cut_extrude_14_sk2:
        Polygon((-11.5, 34.25), (-11.5, 37.75), (-12.5, 34.25), align=None)
    cut_extrude_14_tool2 = extrude(cut_extrude_14_sk2.sketch, amount=-CUT_EXTRUDE_14_REACH, mode=Mode.PRIVATE) & part.part
    # 草图13 → 切除-拉伸14 (cut, up to next)
    with BuildSketch(Plane.XY.offset(23.6), mode=Mode.PRIVATE) as cut_extrude_14_sk3:
        Polygon((11.5, 37.75), (12.5, 34.25), (11.5, 34.25), align=None)
    cut_extrude_14_tool3 = extrude(cut_extrude_14_sk3.sketch, amount=-CUT_EXTRUDE_14_REACH, mode=Mode.PRIVATE) & part.part
    # 草图13 → 切除-拉伸14 (cut, up to next)
    with BuildSketch(Plane.XY.offset(23.6), mode=Mode.PRIVATE) as cut_extrude_14_sk4:
        Polygon((4.5, 34.25), (4.5, 37.75), (3.5, 34.25), align=None)
    cut_extrude_14_tool4 = extrude(cut_extrude_14_sk4.sketch, amount=-CUT_EXTRUDE_14_REACH, mode=Mode.PRIVATE) & part.part
    add(cut_extrude_14_tool1.solids().sort_by_distance((-4.166667, 35.416667, 23.6))[0], mode=Mode.SUBTRACT)
    add(cut_extrude_14_tool2.solids().sort_by_distance((-11.833333, 35.416667, 23.6))[0], mode=Mode.SUBTRACT)
    add(cut_extrude_14_tool3.solids().sort_by_distance((11.833333, 35.416667, 23.6))[0], mode=Mode.SUBTRACT)
    add(cut_extrude_14_tool4.solids().sort_by_distance((4.166667, 35.416667, 23.6))[0], mode=Mode.SUBTRACT)

    # 草图14 → 切除-拉伸15 (cut)
    with BuildSketch(Plane.XY.offset(23.6)):
        Polygon((-15.3, 53.749), (-15.3, 52.749), (-14.3, 53.749), align=None)
        Polygon((14.3, 53.749), (15.3, 52.749), (15.3, 53.749), align=None)
    extrude(amount=-CUT_EXTRUDE_15_DEPTH, mode=Mode.SUBTRACT)


solid = part.part
